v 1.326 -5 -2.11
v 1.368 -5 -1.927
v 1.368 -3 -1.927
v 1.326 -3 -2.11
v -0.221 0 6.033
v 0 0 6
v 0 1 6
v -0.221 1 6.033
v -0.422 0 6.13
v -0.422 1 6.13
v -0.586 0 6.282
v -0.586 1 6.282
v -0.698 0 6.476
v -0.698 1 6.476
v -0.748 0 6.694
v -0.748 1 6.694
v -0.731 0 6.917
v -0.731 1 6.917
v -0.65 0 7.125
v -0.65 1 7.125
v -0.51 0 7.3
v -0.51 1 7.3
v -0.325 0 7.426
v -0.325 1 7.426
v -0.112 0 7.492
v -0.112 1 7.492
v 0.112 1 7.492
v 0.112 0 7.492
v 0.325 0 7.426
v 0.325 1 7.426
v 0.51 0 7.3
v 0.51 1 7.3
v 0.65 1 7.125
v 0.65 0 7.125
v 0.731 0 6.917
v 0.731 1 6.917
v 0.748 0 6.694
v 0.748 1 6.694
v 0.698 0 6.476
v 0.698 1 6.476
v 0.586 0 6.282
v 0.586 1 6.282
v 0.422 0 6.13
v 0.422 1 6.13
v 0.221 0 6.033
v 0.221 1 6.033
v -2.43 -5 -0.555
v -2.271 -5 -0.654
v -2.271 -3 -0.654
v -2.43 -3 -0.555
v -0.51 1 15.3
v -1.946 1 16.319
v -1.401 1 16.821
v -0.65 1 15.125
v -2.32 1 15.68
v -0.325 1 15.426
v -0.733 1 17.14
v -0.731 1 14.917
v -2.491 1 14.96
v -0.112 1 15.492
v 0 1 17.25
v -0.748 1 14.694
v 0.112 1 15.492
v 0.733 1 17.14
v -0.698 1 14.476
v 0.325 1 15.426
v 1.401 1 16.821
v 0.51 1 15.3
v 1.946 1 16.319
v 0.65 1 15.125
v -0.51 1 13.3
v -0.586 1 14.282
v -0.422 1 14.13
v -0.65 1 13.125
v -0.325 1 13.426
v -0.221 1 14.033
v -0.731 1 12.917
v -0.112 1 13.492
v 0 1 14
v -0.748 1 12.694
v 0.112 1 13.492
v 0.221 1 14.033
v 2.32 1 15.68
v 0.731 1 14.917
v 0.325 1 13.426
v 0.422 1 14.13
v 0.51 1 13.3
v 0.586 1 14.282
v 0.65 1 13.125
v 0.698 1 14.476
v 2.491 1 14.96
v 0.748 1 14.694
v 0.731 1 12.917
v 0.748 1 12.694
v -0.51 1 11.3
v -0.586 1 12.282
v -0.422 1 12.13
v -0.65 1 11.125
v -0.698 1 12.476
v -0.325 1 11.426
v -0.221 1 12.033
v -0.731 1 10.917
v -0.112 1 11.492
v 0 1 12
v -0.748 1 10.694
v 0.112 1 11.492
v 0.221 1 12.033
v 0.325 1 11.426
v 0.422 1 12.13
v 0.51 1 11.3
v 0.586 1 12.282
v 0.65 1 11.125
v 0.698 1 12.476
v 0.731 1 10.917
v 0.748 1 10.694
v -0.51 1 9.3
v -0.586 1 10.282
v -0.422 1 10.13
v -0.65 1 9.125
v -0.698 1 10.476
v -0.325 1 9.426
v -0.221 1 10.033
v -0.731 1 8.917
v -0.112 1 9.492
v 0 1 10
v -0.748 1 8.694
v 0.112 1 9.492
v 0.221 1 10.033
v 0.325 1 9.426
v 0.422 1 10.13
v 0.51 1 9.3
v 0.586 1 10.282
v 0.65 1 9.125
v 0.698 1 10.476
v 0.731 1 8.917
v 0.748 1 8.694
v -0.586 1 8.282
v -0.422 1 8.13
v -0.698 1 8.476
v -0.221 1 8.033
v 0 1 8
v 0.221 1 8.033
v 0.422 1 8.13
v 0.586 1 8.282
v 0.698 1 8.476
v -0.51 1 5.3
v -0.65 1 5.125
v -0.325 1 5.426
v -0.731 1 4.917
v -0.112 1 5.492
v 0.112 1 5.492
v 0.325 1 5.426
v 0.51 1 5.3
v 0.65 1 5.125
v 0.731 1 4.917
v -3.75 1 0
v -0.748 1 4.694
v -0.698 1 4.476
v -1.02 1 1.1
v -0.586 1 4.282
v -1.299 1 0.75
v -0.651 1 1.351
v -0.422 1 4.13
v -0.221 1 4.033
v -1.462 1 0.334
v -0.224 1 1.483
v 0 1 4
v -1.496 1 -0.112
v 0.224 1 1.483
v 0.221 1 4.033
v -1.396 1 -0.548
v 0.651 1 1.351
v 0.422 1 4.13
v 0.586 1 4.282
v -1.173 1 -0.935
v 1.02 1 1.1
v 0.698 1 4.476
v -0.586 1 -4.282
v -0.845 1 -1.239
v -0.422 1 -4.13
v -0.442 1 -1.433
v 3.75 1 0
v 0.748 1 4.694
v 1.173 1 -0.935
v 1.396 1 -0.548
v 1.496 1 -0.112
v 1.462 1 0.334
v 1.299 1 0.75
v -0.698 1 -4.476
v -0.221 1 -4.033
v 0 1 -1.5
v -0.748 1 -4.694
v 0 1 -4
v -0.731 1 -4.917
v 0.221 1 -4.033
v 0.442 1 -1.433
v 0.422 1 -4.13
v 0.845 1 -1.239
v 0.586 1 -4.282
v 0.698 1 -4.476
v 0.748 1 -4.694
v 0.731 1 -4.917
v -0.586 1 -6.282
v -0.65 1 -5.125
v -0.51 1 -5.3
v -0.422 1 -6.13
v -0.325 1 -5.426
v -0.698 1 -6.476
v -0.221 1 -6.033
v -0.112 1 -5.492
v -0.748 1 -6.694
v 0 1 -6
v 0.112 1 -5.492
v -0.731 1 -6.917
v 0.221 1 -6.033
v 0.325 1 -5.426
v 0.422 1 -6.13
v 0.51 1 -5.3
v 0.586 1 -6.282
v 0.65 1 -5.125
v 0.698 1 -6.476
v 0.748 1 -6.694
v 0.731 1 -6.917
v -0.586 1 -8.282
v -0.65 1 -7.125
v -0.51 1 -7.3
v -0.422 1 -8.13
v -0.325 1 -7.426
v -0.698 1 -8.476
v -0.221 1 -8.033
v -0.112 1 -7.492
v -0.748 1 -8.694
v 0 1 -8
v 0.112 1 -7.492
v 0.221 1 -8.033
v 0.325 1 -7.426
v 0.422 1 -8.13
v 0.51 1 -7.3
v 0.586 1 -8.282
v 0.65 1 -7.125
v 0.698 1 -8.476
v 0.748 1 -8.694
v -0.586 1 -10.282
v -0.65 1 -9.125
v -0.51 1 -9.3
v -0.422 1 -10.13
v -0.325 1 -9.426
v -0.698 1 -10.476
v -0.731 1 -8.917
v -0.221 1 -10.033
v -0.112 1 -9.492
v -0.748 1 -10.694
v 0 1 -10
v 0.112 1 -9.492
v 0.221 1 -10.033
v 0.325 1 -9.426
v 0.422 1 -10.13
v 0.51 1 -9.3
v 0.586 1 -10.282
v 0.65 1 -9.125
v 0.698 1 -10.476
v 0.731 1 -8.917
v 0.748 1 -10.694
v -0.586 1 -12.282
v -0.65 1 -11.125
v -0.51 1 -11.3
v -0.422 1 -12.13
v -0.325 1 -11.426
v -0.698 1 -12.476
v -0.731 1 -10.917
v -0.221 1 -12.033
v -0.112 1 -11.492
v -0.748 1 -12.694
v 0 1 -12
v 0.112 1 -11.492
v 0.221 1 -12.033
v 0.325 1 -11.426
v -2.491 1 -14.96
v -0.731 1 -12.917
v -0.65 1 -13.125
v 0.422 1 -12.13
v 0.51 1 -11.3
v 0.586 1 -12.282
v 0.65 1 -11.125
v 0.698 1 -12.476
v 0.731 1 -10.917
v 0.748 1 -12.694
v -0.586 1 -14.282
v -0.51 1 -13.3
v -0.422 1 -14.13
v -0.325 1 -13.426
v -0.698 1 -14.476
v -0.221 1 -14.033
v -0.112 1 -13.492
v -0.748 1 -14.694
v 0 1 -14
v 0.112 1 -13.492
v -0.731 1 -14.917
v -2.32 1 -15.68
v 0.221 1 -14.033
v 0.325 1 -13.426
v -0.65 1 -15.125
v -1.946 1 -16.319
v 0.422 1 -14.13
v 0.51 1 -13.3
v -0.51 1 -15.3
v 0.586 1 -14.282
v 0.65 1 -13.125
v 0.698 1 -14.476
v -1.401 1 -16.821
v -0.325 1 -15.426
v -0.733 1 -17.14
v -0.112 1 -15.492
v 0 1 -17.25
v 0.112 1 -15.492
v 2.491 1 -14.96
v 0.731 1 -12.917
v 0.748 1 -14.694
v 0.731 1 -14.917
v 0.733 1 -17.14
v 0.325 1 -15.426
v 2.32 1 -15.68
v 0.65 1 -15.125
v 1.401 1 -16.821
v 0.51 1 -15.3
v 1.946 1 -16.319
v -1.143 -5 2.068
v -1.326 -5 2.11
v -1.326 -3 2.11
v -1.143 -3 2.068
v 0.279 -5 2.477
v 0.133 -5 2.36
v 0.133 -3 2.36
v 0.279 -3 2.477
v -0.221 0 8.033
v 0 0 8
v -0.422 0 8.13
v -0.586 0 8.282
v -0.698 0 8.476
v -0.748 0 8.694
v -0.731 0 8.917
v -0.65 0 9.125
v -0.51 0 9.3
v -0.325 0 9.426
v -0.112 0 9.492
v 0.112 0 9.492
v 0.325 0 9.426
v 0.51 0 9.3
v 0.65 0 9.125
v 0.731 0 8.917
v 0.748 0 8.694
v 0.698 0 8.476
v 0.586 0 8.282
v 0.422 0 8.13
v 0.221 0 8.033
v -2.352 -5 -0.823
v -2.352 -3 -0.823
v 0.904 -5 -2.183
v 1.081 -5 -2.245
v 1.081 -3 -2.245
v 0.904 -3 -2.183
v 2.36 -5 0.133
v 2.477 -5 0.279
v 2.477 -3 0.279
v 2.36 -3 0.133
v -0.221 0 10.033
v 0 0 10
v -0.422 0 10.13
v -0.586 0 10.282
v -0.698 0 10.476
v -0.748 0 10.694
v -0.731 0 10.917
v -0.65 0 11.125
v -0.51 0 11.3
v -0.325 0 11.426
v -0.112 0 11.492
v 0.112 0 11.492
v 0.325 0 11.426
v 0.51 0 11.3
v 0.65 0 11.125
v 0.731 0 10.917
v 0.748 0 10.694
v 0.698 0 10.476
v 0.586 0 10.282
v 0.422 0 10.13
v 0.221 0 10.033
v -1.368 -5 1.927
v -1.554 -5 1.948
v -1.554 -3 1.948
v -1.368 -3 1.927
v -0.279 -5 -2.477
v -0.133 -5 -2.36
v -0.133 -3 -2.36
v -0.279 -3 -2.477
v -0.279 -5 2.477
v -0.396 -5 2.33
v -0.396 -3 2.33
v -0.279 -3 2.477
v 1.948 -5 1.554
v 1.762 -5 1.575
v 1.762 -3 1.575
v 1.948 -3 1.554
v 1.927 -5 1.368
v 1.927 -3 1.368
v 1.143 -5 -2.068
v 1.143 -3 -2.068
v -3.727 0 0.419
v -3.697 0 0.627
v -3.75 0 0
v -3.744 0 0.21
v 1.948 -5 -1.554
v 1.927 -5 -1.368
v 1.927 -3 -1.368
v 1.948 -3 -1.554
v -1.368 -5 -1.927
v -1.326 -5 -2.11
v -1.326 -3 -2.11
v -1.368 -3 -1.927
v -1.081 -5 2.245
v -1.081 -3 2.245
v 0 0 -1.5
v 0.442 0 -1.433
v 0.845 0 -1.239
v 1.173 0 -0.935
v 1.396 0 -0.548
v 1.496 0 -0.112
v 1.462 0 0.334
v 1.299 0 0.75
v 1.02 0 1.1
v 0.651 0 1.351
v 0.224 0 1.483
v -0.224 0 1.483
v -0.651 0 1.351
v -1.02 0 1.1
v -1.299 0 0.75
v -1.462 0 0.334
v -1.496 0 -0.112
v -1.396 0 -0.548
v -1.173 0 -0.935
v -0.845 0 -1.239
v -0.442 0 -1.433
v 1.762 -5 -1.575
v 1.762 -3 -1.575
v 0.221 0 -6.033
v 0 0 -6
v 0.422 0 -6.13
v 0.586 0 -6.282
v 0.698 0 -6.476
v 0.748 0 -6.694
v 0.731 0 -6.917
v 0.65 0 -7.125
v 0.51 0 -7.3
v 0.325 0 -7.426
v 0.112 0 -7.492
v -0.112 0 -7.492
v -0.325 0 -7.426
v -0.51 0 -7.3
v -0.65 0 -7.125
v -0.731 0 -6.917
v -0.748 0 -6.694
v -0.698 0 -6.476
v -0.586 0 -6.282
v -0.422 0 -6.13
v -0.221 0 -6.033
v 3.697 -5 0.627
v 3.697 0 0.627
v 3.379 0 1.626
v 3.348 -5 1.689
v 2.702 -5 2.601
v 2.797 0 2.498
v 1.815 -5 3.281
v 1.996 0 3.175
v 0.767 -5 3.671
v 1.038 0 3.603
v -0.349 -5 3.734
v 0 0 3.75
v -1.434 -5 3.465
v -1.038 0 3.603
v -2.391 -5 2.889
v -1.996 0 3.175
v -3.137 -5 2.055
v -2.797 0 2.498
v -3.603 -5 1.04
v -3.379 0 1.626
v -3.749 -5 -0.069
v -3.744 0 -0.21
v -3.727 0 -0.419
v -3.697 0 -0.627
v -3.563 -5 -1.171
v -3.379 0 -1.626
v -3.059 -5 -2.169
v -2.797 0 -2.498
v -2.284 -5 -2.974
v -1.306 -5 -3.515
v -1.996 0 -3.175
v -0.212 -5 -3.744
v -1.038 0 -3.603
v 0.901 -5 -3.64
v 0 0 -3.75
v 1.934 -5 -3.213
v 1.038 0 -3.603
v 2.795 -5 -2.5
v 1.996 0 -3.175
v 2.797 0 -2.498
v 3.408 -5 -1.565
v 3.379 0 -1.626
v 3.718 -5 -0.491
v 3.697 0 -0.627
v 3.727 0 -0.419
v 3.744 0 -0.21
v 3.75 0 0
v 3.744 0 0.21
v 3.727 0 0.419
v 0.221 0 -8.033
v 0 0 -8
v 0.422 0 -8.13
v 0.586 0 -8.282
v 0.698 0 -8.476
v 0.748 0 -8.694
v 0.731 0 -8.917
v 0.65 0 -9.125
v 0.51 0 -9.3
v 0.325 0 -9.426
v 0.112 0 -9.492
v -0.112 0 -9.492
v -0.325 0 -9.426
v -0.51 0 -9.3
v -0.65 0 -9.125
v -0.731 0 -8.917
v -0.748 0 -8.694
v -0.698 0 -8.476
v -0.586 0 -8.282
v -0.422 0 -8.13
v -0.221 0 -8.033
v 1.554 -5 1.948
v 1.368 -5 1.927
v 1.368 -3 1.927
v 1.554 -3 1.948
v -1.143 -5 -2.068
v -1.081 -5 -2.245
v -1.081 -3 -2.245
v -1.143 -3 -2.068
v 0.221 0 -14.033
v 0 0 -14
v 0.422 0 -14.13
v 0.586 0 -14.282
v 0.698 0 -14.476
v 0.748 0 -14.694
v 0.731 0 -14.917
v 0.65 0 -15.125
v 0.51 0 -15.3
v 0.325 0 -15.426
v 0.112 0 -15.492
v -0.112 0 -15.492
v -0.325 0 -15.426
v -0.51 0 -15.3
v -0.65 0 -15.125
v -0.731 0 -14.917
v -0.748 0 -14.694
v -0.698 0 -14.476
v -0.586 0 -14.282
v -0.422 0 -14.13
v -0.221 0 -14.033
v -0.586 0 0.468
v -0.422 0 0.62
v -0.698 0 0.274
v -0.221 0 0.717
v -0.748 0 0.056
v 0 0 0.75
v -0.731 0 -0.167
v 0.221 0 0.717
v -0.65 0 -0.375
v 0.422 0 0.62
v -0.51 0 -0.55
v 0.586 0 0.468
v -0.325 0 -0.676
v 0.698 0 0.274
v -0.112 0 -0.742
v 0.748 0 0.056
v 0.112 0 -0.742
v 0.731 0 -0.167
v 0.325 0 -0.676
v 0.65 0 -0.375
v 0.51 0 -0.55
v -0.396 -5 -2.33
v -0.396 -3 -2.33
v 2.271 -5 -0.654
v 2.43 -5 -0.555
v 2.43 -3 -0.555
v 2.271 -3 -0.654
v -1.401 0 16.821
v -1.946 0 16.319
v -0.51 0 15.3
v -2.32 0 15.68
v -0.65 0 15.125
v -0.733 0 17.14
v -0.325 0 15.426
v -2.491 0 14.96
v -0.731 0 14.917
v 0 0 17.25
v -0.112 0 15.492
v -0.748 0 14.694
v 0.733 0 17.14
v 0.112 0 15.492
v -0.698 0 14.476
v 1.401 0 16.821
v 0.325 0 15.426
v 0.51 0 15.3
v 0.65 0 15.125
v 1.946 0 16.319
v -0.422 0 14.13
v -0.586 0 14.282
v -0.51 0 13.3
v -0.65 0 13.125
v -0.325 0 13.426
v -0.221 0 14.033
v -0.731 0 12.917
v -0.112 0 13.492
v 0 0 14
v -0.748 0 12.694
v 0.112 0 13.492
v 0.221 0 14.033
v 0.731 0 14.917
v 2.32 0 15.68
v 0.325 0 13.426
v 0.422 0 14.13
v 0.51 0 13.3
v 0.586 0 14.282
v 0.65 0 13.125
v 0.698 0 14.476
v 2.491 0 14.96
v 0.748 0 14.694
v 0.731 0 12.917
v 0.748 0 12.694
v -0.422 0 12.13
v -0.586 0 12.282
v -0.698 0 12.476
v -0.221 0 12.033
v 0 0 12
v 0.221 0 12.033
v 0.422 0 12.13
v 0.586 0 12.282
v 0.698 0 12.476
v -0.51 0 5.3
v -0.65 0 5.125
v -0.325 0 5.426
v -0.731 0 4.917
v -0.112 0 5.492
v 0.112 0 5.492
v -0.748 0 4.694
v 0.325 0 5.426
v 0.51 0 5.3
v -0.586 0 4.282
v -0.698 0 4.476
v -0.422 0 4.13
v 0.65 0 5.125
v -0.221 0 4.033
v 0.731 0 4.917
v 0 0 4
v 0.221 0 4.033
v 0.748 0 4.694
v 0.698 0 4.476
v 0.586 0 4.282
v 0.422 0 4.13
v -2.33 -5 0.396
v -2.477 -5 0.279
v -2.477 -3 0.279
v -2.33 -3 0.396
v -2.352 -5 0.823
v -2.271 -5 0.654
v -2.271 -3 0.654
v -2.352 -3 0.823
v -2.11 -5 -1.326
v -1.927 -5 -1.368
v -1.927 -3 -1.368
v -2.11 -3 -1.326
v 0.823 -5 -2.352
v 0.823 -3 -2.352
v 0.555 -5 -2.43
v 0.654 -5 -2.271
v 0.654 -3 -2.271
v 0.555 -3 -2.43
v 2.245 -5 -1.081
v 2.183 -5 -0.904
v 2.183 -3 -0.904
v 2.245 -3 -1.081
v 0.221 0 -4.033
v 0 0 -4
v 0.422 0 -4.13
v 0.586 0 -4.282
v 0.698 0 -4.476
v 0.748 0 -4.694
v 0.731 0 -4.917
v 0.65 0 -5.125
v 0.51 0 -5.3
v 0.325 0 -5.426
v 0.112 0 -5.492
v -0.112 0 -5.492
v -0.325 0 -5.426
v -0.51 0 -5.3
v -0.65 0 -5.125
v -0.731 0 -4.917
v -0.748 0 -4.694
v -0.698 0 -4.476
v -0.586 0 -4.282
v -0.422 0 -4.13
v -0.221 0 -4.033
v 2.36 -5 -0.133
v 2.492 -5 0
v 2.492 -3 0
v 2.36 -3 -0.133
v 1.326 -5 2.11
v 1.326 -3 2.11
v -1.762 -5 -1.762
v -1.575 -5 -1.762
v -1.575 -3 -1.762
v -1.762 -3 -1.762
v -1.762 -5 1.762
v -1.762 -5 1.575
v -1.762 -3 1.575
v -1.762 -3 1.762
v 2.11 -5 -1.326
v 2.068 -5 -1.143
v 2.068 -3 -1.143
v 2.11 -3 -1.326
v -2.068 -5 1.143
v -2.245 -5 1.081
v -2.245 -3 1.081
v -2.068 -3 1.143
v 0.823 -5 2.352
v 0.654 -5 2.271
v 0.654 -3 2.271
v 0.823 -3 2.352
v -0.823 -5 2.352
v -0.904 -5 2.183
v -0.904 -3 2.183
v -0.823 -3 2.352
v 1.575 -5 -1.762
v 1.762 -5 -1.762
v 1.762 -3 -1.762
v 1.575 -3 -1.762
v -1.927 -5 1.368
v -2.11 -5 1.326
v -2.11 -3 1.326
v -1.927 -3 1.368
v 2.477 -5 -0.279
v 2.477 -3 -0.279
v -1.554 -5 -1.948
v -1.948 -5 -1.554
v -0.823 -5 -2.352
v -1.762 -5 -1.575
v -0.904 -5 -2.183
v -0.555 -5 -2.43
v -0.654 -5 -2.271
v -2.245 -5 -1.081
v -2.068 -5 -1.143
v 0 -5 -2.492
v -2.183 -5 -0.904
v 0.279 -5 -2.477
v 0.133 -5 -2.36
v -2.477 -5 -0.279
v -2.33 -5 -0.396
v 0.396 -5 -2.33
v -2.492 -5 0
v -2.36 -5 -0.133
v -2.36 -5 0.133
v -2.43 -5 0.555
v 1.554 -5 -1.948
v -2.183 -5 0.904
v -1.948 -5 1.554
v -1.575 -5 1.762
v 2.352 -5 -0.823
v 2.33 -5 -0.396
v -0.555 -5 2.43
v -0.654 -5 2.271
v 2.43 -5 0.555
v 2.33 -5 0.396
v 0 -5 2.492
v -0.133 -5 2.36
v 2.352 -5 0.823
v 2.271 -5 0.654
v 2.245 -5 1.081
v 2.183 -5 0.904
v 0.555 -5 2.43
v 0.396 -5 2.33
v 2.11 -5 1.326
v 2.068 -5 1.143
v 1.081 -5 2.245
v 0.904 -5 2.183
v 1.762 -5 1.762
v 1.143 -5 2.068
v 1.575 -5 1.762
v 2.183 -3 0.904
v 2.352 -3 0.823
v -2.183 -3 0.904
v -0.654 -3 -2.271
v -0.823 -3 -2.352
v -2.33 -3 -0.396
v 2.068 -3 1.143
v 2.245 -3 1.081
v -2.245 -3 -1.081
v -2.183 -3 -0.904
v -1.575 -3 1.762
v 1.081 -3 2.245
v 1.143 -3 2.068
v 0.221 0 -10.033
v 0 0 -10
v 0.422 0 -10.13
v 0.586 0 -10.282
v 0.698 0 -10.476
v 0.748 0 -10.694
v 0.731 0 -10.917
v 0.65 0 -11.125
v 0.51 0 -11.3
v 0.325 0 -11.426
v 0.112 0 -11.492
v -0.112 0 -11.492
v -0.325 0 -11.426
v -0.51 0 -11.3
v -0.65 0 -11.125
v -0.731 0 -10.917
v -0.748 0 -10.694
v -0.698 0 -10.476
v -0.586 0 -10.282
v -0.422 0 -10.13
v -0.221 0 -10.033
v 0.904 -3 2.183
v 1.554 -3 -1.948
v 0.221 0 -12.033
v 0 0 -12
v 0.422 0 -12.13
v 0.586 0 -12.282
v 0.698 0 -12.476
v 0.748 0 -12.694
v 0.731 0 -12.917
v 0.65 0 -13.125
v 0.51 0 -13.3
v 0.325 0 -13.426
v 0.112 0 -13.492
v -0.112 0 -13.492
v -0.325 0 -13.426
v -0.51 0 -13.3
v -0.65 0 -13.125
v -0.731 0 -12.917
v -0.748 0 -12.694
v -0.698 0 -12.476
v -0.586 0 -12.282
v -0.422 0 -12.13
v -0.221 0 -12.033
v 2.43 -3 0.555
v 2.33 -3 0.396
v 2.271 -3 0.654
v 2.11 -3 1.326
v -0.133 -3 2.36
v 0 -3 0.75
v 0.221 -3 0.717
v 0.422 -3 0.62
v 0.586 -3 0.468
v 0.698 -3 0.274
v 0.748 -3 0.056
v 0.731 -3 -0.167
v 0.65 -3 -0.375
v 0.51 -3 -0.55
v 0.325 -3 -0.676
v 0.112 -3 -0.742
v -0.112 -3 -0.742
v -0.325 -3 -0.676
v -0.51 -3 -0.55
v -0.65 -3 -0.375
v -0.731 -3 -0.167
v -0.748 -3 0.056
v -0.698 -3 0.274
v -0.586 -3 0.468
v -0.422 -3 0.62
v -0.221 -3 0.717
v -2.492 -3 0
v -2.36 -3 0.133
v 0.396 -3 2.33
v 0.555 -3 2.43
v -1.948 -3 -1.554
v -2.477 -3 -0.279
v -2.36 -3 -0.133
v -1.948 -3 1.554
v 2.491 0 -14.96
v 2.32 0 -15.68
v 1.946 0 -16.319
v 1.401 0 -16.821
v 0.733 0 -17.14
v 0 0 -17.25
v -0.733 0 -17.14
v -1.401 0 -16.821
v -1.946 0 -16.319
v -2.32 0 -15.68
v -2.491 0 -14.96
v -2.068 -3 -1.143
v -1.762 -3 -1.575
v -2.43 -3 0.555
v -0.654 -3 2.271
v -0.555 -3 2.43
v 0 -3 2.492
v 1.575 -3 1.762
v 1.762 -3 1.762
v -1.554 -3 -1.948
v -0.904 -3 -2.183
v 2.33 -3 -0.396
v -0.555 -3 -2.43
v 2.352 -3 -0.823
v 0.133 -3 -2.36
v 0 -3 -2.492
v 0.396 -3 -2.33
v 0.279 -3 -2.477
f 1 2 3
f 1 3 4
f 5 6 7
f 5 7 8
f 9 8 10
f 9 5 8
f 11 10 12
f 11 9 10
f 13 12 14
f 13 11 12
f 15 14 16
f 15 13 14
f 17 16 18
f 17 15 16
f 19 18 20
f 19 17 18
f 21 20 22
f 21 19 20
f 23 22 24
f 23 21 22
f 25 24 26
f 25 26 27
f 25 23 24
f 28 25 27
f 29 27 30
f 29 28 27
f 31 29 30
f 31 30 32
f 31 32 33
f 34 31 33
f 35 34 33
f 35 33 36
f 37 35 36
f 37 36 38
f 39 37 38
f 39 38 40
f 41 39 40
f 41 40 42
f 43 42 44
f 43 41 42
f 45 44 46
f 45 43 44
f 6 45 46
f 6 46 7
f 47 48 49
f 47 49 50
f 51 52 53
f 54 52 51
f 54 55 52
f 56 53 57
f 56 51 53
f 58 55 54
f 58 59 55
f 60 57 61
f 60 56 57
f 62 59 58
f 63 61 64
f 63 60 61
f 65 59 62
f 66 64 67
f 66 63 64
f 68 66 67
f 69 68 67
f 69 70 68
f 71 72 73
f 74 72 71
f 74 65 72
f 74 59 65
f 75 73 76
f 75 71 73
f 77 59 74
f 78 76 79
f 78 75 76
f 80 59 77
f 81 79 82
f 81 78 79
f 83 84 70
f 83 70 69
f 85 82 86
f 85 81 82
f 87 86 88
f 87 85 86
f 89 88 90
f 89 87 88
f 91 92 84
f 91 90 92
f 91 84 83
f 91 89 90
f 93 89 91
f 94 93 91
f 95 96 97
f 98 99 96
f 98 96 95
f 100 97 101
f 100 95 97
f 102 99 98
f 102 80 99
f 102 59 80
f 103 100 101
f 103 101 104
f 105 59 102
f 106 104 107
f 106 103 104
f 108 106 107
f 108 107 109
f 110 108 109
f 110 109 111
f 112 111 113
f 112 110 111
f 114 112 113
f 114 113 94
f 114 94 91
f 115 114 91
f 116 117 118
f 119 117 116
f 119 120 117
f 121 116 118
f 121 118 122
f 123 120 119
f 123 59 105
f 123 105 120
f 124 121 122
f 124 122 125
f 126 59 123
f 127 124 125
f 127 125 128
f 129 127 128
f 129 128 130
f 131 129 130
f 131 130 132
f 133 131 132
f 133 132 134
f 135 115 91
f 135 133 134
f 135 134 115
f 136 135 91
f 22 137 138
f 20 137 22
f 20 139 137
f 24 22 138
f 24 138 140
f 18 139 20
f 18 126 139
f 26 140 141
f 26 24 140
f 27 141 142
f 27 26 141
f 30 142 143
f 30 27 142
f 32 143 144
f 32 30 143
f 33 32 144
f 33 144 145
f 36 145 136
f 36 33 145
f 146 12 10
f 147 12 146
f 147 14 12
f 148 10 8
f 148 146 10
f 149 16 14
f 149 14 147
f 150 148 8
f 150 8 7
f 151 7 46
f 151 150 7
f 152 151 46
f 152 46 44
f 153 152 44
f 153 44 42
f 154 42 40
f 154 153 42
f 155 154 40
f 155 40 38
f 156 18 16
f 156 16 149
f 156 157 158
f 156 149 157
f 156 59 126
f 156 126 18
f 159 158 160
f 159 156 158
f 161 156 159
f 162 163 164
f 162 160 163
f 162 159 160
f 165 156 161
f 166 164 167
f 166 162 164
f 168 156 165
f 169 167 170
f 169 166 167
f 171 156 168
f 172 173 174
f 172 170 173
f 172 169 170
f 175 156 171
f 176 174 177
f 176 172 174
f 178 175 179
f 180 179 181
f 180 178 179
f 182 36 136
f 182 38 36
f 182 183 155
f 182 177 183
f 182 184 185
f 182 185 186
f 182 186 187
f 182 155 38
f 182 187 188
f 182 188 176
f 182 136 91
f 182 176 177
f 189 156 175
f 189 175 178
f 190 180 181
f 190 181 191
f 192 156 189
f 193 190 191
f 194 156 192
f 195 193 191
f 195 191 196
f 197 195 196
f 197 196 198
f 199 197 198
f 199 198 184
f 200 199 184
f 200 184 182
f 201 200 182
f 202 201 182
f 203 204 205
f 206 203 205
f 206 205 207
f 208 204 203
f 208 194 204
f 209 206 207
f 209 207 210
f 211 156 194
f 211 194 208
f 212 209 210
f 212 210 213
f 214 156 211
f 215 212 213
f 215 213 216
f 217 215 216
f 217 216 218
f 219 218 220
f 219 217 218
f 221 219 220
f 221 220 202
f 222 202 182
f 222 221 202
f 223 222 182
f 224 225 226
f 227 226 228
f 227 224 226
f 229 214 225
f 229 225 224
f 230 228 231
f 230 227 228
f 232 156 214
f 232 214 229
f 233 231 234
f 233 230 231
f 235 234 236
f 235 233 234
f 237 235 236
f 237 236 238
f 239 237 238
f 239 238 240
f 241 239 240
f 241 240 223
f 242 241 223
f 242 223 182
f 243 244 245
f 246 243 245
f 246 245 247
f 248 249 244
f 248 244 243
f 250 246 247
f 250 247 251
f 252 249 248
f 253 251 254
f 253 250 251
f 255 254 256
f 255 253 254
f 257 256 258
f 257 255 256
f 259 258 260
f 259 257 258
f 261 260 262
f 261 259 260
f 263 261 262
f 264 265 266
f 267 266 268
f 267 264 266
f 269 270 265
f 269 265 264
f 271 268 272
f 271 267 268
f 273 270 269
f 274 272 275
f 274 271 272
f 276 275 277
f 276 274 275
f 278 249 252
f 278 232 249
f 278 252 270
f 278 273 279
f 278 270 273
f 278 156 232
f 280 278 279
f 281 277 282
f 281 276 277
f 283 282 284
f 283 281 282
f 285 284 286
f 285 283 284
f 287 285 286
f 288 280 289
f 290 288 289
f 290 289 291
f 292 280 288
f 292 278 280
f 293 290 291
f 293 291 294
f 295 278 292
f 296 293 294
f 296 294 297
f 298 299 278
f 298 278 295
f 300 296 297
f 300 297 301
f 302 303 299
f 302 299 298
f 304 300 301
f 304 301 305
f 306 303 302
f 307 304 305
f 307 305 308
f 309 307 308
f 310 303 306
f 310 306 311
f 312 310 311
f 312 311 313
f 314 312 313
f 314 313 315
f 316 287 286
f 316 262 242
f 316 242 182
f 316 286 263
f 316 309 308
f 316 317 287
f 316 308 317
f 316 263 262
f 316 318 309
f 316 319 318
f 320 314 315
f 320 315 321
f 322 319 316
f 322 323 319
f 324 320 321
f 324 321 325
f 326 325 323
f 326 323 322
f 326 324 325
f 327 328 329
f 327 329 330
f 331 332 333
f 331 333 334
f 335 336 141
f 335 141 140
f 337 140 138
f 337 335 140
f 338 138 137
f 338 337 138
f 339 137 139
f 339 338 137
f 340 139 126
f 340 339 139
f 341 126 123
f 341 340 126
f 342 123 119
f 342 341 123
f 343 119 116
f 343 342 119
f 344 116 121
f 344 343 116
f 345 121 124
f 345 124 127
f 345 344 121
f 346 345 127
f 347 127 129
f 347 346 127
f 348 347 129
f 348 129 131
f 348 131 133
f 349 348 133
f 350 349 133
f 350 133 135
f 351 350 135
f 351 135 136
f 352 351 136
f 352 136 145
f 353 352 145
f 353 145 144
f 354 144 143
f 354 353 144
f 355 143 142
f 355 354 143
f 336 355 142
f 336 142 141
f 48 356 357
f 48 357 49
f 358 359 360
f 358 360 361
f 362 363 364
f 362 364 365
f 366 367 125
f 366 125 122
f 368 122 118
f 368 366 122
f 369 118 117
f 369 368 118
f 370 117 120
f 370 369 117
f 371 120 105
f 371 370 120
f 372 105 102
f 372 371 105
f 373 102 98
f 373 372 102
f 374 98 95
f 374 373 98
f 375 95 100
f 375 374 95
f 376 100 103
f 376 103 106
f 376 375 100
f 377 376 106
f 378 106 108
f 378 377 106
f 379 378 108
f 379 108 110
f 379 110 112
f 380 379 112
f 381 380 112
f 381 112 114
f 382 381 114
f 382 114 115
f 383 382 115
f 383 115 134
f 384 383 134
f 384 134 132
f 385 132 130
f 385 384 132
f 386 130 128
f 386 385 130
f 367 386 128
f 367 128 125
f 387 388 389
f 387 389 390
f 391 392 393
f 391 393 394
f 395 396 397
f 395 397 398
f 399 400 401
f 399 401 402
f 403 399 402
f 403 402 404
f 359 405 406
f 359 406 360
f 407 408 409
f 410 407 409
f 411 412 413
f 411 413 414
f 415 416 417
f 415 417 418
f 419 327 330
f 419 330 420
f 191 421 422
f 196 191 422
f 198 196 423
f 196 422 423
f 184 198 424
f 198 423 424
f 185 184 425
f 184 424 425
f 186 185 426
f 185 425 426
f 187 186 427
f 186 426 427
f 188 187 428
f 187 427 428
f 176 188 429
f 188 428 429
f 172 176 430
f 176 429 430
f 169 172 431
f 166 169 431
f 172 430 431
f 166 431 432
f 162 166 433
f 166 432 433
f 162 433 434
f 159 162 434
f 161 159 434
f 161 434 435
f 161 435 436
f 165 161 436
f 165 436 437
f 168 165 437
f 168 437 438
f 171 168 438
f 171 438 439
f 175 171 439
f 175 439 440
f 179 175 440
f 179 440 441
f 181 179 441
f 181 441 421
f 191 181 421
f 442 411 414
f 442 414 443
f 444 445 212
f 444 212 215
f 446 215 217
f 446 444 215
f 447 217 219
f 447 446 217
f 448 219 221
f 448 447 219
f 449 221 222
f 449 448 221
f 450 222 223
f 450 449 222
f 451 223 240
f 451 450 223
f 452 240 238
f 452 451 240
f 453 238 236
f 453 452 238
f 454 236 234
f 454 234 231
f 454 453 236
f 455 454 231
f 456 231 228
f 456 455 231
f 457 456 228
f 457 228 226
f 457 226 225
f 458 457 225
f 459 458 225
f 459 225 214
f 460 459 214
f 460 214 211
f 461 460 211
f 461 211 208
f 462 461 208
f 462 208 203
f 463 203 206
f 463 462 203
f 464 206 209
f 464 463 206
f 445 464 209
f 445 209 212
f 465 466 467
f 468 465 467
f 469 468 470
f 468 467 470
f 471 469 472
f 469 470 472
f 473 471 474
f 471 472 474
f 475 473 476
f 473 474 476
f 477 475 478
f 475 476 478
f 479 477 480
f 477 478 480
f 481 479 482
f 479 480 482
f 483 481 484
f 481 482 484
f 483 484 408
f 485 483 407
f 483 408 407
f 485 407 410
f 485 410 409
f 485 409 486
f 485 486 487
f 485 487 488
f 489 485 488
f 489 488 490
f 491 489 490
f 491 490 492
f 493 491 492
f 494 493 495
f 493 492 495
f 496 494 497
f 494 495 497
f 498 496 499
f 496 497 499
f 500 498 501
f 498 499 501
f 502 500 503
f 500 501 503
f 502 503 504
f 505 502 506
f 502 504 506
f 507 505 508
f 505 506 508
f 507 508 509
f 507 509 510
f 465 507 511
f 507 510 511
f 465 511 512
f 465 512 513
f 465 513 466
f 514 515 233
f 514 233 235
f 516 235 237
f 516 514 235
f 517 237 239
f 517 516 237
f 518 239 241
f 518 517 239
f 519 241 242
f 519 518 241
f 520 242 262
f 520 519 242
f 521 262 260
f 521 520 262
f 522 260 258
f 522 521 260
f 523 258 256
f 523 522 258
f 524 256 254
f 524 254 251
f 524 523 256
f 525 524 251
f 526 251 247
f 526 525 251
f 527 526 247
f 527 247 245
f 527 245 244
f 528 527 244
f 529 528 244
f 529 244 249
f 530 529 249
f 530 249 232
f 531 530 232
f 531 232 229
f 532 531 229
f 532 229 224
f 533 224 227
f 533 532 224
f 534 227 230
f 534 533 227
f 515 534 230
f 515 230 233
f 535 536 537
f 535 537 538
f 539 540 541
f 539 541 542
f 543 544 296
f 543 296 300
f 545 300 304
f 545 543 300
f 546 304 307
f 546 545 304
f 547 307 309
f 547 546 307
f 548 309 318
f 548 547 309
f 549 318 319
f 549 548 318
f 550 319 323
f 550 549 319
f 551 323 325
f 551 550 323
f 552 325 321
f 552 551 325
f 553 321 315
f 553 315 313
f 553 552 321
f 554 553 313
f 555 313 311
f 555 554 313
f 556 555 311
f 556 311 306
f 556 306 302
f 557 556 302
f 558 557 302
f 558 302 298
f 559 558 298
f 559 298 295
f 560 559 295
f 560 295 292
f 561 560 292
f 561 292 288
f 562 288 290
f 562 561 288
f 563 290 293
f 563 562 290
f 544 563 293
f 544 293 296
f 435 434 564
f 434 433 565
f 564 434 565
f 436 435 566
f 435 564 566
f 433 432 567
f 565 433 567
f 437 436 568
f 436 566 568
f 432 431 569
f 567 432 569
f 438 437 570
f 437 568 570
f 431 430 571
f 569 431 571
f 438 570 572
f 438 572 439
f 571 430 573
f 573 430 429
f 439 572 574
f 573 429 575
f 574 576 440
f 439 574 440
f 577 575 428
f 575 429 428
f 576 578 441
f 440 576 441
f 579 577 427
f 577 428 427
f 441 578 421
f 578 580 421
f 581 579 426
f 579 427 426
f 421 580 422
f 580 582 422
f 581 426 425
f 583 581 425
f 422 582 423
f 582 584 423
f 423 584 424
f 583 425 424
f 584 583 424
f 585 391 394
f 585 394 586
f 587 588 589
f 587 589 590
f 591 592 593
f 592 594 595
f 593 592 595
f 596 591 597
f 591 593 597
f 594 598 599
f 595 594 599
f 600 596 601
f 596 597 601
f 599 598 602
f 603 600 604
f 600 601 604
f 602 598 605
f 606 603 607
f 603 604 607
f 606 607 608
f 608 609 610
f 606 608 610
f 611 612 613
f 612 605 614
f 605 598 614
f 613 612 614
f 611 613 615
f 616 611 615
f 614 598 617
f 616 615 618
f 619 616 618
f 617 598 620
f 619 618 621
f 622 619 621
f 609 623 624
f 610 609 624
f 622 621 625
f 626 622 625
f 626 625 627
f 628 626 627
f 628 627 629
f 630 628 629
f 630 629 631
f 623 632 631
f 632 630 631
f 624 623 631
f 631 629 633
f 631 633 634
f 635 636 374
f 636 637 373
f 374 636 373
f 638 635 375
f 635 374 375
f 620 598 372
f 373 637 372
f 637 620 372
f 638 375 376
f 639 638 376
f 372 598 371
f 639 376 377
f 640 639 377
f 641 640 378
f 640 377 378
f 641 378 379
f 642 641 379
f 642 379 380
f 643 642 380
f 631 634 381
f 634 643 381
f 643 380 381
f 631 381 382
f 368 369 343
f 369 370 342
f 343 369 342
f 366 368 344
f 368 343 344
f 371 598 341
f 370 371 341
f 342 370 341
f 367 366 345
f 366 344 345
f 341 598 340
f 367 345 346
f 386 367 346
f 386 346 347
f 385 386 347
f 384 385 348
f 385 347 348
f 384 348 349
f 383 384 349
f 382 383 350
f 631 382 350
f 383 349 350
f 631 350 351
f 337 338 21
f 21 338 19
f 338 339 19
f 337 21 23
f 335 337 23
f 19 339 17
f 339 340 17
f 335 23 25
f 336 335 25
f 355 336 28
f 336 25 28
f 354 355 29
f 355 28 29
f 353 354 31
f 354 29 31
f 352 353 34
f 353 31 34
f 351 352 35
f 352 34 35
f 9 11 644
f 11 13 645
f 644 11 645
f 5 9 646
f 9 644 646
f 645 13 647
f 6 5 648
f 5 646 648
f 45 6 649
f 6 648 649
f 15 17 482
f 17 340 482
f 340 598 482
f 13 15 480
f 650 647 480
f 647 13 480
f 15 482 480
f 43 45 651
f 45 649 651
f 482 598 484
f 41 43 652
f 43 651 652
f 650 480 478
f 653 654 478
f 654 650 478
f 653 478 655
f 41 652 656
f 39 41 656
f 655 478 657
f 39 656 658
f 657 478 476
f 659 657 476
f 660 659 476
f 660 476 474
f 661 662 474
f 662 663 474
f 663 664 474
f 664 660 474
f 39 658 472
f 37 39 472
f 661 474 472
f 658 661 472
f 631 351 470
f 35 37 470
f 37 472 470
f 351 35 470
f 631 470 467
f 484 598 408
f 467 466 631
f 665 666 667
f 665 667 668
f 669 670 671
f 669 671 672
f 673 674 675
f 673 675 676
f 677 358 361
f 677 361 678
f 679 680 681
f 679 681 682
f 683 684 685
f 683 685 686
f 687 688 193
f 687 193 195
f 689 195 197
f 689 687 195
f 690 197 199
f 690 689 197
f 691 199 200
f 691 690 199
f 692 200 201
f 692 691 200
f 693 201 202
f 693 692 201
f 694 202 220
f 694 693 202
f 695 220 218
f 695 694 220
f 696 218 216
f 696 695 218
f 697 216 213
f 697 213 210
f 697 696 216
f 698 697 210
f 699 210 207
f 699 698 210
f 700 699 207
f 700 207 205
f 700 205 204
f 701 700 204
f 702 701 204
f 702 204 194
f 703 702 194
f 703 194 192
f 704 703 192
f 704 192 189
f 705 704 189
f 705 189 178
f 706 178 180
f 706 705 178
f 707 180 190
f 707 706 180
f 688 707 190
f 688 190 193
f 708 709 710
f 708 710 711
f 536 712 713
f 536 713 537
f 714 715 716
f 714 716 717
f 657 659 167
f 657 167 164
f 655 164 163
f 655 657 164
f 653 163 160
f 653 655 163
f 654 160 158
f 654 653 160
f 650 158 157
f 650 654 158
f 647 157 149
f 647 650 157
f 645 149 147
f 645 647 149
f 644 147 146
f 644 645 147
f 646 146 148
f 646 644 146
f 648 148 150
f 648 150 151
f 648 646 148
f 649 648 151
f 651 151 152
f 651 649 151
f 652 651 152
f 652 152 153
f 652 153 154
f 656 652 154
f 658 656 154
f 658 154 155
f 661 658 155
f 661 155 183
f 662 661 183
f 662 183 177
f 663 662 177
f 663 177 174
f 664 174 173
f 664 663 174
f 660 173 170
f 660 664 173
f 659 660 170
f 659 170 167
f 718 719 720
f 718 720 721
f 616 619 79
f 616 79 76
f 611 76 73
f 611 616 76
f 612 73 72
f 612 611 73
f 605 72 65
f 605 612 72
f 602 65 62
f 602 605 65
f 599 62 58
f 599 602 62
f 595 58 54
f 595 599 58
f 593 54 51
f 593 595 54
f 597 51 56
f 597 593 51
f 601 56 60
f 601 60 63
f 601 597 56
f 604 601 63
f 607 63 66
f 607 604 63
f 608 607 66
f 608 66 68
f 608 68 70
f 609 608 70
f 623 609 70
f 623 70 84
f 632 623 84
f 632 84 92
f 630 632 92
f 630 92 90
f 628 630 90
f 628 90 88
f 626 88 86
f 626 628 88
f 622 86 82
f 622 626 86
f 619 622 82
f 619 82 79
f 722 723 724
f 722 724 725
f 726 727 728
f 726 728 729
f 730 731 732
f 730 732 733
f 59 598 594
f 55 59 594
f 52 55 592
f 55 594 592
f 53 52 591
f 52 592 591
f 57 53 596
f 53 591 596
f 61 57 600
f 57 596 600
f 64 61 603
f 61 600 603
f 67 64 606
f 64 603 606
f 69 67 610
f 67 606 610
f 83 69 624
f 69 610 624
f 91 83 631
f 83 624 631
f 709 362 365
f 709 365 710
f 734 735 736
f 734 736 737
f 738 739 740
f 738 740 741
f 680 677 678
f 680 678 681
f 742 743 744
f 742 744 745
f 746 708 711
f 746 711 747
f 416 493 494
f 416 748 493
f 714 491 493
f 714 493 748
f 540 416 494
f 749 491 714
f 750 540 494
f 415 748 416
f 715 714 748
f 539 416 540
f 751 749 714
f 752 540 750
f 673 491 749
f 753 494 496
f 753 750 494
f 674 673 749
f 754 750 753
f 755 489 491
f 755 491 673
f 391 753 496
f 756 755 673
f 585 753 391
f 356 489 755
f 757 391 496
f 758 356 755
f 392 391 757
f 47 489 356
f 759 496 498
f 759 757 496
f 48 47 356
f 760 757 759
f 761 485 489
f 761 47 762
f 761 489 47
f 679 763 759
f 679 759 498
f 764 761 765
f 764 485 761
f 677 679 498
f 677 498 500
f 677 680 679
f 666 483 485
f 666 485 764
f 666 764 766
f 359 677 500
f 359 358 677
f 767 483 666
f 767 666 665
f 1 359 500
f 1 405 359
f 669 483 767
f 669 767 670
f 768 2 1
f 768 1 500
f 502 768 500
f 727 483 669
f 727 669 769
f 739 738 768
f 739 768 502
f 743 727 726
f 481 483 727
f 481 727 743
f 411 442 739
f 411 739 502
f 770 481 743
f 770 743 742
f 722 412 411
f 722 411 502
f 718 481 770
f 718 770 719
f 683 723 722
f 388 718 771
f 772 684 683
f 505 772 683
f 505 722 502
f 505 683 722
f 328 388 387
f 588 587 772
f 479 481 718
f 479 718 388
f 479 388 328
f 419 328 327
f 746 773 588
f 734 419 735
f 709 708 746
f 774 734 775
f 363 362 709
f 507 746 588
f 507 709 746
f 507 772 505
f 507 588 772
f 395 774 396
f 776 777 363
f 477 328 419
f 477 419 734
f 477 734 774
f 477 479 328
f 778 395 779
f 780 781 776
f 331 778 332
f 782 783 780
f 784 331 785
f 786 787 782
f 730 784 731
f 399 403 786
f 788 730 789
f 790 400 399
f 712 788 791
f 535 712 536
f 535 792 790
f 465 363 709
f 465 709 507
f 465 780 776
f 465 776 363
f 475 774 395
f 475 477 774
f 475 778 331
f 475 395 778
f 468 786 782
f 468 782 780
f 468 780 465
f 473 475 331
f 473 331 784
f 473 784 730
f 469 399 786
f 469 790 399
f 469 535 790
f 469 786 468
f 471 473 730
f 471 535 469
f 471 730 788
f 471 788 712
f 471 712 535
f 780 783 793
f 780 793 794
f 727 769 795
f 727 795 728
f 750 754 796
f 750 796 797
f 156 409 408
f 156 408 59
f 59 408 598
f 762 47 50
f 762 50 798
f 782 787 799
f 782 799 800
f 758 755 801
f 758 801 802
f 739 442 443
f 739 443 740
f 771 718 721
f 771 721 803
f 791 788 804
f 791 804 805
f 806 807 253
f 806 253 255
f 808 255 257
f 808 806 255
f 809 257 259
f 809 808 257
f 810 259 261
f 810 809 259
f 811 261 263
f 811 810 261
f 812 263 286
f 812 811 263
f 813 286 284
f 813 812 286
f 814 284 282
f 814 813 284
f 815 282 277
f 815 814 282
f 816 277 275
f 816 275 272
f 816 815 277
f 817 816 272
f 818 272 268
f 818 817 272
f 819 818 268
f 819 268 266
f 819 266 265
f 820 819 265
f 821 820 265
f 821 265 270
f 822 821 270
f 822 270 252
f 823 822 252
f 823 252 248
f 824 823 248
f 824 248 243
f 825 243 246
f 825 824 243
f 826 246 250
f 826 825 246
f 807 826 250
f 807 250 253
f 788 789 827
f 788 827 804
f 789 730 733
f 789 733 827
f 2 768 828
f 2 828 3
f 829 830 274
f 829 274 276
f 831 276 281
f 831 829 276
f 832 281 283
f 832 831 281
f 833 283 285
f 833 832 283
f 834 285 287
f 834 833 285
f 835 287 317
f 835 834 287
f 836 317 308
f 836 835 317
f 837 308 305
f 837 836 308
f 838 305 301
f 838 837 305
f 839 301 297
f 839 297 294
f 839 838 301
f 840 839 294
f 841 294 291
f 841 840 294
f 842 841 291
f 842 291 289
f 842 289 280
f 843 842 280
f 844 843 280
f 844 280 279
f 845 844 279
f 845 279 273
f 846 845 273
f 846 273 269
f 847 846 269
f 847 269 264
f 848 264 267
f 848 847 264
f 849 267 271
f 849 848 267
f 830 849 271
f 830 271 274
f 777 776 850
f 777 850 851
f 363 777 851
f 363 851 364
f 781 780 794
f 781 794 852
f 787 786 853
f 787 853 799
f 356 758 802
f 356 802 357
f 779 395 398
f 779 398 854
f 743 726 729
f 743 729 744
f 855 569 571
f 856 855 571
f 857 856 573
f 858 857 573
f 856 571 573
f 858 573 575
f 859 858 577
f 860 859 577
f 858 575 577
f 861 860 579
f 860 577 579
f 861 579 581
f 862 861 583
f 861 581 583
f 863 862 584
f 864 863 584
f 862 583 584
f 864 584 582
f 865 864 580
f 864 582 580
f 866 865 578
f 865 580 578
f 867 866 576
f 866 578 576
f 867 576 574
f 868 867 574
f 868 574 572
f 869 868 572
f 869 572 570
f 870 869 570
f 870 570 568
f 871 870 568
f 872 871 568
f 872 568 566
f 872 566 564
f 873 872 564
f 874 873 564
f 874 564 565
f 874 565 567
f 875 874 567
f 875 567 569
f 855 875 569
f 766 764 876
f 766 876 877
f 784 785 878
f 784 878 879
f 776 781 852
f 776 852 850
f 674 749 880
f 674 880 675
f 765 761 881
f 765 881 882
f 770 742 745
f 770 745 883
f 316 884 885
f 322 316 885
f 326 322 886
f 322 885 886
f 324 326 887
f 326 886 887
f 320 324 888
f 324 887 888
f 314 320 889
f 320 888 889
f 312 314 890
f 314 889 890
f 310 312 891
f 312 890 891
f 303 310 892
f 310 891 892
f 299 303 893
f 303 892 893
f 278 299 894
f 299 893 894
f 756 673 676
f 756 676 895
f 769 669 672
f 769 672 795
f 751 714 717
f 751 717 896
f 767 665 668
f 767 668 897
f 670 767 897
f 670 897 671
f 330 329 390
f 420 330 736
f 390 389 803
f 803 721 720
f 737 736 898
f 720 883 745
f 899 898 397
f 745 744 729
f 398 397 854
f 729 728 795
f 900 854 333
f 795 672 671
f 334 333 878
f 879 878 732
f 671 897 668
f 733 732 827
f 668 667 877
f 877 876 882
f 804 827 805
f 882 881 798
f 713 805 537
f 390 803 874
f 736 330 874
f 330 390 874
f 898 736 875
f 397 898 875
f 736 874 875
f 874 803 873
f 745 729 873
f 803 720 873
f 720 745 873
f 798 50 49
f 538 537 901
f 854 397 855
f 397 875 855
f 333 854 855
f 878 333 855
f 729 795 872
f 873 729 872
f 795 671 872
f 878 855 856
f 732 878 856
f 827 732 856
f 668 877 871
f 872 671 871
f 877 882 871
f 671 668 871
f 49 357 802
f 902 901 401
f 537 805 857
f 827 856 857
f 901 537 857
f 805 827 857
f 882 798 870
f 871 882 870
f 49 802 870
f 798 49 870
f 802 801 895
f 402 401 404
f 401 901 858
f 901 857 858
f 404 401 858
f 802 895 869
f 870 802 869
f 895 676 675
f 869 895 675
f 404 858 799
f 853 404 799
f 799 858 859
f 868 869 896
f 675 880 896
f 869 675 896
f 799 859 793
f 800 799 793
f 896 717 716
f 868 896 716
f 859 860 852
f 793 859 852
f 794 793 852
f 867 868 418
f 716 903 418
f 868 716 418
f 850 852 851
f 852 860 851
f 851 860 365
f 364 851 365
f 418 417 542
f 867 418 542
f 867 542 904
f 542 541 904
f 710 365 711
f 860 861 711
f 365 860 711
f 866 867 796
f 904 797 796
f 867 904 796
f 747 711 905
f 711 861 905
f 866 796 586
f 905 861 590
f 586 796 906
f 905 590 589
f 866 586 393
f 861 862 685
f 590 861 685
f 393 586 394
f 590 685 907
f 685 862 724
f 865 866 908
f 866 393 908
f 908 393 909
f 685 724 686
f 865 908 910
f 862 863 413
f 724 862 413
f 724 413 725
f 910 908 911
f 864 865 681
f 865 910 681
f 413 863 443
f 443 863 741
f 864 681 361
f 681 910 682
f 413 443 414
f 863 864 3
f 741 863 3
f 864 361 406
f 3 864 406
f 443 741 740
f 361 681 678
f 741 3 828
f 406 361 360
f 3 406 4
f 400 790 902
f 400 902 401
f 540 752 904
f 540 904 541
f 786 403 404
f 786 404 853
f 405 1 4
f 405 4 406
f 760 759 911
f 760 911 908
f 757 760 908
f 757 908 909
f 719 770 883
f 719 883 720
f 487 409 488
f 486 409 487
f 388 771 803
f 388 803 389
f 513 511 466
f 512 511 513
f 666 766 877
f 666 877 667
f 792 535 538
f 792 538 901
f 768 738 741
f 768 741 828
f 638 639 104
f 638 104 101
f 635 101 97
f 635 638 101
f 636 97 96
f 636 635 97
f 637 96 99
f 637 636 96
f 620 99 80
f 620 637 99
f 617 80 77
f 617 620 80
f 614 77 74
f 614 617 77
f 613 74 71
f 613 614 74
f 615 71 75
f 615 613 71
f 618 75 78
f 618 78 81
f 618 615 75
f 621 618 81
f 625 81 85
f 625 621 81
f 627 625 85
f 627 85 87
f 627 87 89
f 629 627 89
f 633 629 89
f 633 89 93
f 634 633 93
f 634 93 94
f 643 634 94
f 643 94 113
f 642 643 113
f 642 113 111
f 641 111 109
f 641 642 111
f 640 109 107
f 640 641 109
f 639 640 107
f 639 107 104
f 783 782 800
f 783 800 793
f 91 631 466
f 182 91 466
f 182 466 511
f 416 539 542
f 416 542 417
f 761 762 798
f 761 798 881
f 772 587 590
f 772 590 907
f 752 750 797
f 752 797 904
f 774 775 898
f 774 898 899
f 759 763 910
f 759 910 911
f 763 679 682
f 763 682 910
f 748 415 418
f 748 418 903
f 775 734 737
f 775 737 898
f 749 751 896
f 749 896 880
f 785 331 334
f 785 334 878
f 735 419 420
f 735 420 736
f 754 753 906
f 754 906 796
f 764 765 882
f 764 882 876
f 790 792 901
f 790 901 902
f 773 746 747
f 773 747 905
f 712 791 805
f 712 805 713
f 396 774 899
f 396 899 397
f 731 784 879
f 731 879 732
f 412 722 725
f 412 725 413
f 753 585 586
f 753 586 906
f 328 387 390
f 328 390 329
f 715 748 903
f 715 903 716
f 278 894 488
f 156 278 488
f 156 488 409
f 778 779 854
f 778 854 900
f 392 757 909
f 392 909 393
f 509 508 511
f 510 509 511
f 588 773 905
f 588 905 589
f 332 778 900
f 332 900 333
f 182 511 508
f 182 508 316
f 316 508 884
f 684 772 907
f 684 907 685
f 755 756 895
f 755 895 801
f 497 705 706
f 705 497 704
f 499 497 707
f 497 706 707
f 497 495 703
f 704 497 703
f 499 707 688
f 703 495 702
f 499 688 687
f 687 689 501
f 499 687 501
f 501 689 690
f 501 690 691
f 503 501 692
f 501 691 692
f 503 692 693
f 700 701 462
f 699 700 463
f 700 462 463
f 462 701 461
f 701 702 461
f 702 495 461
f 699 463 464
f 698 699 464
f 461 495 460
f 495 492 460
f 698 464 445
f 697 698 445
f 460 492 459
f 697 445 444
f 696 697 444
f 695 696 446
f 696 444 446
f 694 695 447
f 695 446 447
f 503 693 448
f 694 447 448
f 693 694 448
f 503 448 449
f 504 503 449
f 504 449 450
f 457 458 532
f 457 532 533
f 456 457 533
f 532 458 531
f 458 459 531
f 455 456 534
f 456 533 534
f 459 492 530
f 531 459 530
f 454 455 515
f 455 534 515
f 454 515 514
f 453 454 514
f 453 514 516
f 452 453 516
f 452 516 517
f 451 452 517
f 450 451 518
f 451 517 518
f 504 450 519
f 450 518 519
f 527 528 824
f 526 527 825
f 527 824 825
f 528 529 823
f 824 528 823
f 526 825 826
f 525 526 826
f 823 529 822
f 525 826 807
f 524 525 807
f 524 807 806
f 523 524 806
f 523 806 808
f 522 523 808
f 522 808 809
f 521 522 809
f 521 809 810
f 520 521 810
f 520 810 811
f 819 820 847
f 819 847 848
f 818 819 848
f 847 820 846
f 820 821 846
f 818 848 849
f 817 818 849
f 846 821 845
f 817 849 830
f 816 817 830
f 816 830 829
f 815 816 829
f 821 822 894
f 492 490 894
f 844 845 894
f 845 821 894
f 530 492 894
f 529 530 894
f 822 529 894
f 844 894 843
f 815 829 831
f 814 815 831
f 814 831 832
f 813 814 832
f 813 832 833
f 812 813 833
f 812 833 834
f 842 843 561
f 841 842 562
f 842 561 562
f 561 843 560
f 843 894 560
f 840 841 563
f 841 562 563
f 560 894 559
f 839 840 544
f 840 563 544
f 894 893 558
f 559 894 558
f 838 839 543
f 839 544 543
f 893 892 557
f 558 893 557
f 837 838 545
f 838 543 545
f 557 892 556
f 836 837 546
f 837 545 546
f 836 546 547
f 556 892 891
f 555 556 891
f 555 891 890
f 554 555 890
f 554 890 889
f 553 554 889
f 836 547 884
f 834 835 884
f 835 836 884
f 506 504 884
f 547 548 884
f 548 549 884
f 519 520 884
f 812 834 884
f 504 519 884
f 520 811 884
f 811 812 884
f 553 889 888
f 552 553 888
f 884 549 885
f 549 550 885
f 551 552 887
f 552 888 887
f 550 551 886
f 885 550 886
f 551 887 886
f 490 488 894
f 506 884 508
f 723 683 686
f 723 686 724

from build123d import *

# Parameters (mm, degrees)
SKETCH1_R           = 0.75
BOSS_EXTRUDE1_DEPTH = 1
SKETCH3_R           = 3.75
BOSS_EXTRUDE2_DEPTH = 5
SKETCH3_3_R         = 1.5
CUT_EXTRUDE1_DEPTH  = 19.347343132
SKETCH1_2_R         = 0.75
CUT_EXTRUDE2_DEPTH  = 19.347343132
SKETCH4_R           = 2.355
CUT_EXTRUDE3_DEPTH  = 2
CUT_EXTRUDE4_DEPTH  = 2
CIRPATTERN1_COUNT   = 56


with BuildPart() as part:
    # Sketch1 → Boss-Extrude1 (new body)
    with BuildSketch(Plane(origin=(0, 0, 0), x_dir=(1, 0, 0), z_dir=(0, 1, 0))):
        with BuildLine():
            Line((-2.49119588, 14.959626071), (-3.75, 0))
            Line((-3.75, 0), (-2.49119588, -14.959626071))
            ThreePointArc((-2.49119588, -14.959626071), (0, -17.25), (2.49119588, -14.959626071))
            Line((2.49119588, -14.959626071), (3.75, 0))
            Line((3.75, 0), (2.49119588, 14.959626071))
            ThreePointArc((2.49119588, 14.959626071), (0, 17.25), (-2.49119588, 14.959626071))
        make_face()
        with Locations(Location((0, 14.75, 0), (0, 0, 270))):
            Circle(SKETCH1_R, mode=Mode.SUBTRACT)
        with Locations(Location((0, 12.75, 0), (0, 0, 270))):
            Circle(SKETCH1_R, mode=Mode.SUBTRACT)
        with Locations(Location((0, 10.75, 0), (0, 0, 270))):
            Circle(SKETCH1_R, mode=Mode.SUBTRACT)
        with Locations(Location((0, 8.75, 0), (0, 0, 270))):
            Circle(SKETCH1_R, mode=Mode.SUBTRACT)
        with Locations(Location((0, 6.75, 0), (0, 0, 270))):
            Circle(SKETCH1_R, mode=Mode.SUBTRACT)
        with Locations(Location((0, 4.75, 0), (0, 0, 270))):
            Circle(SKETCH1_R, mode=Mode.SUBTRACT)
        with Locations(Location((0, 0, 0), (0, 0, 270))):
            Circle(SKETCH1_R, mode=Mode.SUBTRACT)
        with Locations(Location((0, -14.75, 0), (0, 0, 90))):
            Circle(SKETCH1_R, mode=Mode.SUBTRACT)
        with Locations(Location((0, -12.75, 0), (0, 0, 90))):
            Circle(SKETCH1_R, mode=Mode.SUBTRACT)
        with Locations(Location((0, -10.75, 0), (0, 0, 90))):
            Circle(SKETCH1_R, mode=Mode.SUBTRACT)
        with Locations(Location((0, -8.75, 0), (0, 0, 90))):
            Circle(SKETCH1_R, mode=Mode.SUBTRACT)
        with Locations(Location((0, -6.75, 0), (0, 0, 90))):
            Circle(SKETCH1_R, mode=Mode.SUBTRACT)
        with Locations(Location((0, -4.75, 0), (0, 0, 90))):
            Circle(SKETCH1_R, mode=Mode.SUBTRACT)
    extrude(amount=BOSS_EXTRUDE1_DEPTH)

    # Sketch3 → Boss-Extrude2 (add)
    with BuildSketch(Plane.XZ):
        with Locations(Location((0, 0, 0), (0, 0, 9.619846544))):
            Circle(SKETCH3_R)
    extrude(amount=BOSS_EXTRUDE2_DEPTH)

    # Sketch3<3> → Cut-Extrude1 (cut, through all)
    with BuildSketch(Plane.XZ):
        with Locations(Location((0, 0, 0), (0, 0, 270))):
            Circle(SKETCH3_3_R)
    extrude(amount=-CUT_EXTRUDE1_DEPTH, mode=Mode.SUBTRACT)

    # Sketch1<2> → Cut-Extrude2 (cut, through all)
    with BuildSketch(Plane(origin=(0, 0, 0), x_dir=(1, 0, 0), z_dir=(0, 1, 0))):
        with Locations(Location((0, 0, 0), (0, 0, 270))):
            Circle(SKETCH1_2_R)
    extrude(amount=-CUT_EXTRUDE2_DEPTH, mode=Mode.SUBTRACT)

    # Sketch4 → Cut-Extrude3 (cut)
    with BuildSketch(Plane.XZ.offset(5)):
        with Locations(Location((0, 0, 0), (0, 0, 270))):
            Circle(SKETCH4_R)
    extrude(amount=-CUT_EXTRUDE3_DEPTH, mode=Mode.SUBTRACT)

    # Sketch5 → Cut-Extrude4 (cut)
    with BuildSketch(Plane.XZ.offset(5)):
        with BuildLine():
            Line((-0.141421356, 2.35074988), (0, 2.492171237))
            Line((0, 2.492171237), (0.141421356, 2.35074988))
            ThreePointArc((0.141421356, 2.35074988), (0, 2.355), (-0.141421356, 2.35074988))
        make_face()
    cut_extrude4 = extrude(amount=-CUT_EXTRUDE4_DEPTH, mode=Mode.SUBTRACT)

    # CirPattern1: Cut-Extrude4 ×56 about axis
    cirpattern1_axis = Axis((0, 0, 0), (0, 1, 0))
    for i in range(1, CIRPATTERN1_COUNT):
        add(cut_extrude4.rotate(cirpattern1_axis, i * 360 / CIRPATTERN1_COUNT), mode=Mode.SUBTRACT)


solid = part.part
